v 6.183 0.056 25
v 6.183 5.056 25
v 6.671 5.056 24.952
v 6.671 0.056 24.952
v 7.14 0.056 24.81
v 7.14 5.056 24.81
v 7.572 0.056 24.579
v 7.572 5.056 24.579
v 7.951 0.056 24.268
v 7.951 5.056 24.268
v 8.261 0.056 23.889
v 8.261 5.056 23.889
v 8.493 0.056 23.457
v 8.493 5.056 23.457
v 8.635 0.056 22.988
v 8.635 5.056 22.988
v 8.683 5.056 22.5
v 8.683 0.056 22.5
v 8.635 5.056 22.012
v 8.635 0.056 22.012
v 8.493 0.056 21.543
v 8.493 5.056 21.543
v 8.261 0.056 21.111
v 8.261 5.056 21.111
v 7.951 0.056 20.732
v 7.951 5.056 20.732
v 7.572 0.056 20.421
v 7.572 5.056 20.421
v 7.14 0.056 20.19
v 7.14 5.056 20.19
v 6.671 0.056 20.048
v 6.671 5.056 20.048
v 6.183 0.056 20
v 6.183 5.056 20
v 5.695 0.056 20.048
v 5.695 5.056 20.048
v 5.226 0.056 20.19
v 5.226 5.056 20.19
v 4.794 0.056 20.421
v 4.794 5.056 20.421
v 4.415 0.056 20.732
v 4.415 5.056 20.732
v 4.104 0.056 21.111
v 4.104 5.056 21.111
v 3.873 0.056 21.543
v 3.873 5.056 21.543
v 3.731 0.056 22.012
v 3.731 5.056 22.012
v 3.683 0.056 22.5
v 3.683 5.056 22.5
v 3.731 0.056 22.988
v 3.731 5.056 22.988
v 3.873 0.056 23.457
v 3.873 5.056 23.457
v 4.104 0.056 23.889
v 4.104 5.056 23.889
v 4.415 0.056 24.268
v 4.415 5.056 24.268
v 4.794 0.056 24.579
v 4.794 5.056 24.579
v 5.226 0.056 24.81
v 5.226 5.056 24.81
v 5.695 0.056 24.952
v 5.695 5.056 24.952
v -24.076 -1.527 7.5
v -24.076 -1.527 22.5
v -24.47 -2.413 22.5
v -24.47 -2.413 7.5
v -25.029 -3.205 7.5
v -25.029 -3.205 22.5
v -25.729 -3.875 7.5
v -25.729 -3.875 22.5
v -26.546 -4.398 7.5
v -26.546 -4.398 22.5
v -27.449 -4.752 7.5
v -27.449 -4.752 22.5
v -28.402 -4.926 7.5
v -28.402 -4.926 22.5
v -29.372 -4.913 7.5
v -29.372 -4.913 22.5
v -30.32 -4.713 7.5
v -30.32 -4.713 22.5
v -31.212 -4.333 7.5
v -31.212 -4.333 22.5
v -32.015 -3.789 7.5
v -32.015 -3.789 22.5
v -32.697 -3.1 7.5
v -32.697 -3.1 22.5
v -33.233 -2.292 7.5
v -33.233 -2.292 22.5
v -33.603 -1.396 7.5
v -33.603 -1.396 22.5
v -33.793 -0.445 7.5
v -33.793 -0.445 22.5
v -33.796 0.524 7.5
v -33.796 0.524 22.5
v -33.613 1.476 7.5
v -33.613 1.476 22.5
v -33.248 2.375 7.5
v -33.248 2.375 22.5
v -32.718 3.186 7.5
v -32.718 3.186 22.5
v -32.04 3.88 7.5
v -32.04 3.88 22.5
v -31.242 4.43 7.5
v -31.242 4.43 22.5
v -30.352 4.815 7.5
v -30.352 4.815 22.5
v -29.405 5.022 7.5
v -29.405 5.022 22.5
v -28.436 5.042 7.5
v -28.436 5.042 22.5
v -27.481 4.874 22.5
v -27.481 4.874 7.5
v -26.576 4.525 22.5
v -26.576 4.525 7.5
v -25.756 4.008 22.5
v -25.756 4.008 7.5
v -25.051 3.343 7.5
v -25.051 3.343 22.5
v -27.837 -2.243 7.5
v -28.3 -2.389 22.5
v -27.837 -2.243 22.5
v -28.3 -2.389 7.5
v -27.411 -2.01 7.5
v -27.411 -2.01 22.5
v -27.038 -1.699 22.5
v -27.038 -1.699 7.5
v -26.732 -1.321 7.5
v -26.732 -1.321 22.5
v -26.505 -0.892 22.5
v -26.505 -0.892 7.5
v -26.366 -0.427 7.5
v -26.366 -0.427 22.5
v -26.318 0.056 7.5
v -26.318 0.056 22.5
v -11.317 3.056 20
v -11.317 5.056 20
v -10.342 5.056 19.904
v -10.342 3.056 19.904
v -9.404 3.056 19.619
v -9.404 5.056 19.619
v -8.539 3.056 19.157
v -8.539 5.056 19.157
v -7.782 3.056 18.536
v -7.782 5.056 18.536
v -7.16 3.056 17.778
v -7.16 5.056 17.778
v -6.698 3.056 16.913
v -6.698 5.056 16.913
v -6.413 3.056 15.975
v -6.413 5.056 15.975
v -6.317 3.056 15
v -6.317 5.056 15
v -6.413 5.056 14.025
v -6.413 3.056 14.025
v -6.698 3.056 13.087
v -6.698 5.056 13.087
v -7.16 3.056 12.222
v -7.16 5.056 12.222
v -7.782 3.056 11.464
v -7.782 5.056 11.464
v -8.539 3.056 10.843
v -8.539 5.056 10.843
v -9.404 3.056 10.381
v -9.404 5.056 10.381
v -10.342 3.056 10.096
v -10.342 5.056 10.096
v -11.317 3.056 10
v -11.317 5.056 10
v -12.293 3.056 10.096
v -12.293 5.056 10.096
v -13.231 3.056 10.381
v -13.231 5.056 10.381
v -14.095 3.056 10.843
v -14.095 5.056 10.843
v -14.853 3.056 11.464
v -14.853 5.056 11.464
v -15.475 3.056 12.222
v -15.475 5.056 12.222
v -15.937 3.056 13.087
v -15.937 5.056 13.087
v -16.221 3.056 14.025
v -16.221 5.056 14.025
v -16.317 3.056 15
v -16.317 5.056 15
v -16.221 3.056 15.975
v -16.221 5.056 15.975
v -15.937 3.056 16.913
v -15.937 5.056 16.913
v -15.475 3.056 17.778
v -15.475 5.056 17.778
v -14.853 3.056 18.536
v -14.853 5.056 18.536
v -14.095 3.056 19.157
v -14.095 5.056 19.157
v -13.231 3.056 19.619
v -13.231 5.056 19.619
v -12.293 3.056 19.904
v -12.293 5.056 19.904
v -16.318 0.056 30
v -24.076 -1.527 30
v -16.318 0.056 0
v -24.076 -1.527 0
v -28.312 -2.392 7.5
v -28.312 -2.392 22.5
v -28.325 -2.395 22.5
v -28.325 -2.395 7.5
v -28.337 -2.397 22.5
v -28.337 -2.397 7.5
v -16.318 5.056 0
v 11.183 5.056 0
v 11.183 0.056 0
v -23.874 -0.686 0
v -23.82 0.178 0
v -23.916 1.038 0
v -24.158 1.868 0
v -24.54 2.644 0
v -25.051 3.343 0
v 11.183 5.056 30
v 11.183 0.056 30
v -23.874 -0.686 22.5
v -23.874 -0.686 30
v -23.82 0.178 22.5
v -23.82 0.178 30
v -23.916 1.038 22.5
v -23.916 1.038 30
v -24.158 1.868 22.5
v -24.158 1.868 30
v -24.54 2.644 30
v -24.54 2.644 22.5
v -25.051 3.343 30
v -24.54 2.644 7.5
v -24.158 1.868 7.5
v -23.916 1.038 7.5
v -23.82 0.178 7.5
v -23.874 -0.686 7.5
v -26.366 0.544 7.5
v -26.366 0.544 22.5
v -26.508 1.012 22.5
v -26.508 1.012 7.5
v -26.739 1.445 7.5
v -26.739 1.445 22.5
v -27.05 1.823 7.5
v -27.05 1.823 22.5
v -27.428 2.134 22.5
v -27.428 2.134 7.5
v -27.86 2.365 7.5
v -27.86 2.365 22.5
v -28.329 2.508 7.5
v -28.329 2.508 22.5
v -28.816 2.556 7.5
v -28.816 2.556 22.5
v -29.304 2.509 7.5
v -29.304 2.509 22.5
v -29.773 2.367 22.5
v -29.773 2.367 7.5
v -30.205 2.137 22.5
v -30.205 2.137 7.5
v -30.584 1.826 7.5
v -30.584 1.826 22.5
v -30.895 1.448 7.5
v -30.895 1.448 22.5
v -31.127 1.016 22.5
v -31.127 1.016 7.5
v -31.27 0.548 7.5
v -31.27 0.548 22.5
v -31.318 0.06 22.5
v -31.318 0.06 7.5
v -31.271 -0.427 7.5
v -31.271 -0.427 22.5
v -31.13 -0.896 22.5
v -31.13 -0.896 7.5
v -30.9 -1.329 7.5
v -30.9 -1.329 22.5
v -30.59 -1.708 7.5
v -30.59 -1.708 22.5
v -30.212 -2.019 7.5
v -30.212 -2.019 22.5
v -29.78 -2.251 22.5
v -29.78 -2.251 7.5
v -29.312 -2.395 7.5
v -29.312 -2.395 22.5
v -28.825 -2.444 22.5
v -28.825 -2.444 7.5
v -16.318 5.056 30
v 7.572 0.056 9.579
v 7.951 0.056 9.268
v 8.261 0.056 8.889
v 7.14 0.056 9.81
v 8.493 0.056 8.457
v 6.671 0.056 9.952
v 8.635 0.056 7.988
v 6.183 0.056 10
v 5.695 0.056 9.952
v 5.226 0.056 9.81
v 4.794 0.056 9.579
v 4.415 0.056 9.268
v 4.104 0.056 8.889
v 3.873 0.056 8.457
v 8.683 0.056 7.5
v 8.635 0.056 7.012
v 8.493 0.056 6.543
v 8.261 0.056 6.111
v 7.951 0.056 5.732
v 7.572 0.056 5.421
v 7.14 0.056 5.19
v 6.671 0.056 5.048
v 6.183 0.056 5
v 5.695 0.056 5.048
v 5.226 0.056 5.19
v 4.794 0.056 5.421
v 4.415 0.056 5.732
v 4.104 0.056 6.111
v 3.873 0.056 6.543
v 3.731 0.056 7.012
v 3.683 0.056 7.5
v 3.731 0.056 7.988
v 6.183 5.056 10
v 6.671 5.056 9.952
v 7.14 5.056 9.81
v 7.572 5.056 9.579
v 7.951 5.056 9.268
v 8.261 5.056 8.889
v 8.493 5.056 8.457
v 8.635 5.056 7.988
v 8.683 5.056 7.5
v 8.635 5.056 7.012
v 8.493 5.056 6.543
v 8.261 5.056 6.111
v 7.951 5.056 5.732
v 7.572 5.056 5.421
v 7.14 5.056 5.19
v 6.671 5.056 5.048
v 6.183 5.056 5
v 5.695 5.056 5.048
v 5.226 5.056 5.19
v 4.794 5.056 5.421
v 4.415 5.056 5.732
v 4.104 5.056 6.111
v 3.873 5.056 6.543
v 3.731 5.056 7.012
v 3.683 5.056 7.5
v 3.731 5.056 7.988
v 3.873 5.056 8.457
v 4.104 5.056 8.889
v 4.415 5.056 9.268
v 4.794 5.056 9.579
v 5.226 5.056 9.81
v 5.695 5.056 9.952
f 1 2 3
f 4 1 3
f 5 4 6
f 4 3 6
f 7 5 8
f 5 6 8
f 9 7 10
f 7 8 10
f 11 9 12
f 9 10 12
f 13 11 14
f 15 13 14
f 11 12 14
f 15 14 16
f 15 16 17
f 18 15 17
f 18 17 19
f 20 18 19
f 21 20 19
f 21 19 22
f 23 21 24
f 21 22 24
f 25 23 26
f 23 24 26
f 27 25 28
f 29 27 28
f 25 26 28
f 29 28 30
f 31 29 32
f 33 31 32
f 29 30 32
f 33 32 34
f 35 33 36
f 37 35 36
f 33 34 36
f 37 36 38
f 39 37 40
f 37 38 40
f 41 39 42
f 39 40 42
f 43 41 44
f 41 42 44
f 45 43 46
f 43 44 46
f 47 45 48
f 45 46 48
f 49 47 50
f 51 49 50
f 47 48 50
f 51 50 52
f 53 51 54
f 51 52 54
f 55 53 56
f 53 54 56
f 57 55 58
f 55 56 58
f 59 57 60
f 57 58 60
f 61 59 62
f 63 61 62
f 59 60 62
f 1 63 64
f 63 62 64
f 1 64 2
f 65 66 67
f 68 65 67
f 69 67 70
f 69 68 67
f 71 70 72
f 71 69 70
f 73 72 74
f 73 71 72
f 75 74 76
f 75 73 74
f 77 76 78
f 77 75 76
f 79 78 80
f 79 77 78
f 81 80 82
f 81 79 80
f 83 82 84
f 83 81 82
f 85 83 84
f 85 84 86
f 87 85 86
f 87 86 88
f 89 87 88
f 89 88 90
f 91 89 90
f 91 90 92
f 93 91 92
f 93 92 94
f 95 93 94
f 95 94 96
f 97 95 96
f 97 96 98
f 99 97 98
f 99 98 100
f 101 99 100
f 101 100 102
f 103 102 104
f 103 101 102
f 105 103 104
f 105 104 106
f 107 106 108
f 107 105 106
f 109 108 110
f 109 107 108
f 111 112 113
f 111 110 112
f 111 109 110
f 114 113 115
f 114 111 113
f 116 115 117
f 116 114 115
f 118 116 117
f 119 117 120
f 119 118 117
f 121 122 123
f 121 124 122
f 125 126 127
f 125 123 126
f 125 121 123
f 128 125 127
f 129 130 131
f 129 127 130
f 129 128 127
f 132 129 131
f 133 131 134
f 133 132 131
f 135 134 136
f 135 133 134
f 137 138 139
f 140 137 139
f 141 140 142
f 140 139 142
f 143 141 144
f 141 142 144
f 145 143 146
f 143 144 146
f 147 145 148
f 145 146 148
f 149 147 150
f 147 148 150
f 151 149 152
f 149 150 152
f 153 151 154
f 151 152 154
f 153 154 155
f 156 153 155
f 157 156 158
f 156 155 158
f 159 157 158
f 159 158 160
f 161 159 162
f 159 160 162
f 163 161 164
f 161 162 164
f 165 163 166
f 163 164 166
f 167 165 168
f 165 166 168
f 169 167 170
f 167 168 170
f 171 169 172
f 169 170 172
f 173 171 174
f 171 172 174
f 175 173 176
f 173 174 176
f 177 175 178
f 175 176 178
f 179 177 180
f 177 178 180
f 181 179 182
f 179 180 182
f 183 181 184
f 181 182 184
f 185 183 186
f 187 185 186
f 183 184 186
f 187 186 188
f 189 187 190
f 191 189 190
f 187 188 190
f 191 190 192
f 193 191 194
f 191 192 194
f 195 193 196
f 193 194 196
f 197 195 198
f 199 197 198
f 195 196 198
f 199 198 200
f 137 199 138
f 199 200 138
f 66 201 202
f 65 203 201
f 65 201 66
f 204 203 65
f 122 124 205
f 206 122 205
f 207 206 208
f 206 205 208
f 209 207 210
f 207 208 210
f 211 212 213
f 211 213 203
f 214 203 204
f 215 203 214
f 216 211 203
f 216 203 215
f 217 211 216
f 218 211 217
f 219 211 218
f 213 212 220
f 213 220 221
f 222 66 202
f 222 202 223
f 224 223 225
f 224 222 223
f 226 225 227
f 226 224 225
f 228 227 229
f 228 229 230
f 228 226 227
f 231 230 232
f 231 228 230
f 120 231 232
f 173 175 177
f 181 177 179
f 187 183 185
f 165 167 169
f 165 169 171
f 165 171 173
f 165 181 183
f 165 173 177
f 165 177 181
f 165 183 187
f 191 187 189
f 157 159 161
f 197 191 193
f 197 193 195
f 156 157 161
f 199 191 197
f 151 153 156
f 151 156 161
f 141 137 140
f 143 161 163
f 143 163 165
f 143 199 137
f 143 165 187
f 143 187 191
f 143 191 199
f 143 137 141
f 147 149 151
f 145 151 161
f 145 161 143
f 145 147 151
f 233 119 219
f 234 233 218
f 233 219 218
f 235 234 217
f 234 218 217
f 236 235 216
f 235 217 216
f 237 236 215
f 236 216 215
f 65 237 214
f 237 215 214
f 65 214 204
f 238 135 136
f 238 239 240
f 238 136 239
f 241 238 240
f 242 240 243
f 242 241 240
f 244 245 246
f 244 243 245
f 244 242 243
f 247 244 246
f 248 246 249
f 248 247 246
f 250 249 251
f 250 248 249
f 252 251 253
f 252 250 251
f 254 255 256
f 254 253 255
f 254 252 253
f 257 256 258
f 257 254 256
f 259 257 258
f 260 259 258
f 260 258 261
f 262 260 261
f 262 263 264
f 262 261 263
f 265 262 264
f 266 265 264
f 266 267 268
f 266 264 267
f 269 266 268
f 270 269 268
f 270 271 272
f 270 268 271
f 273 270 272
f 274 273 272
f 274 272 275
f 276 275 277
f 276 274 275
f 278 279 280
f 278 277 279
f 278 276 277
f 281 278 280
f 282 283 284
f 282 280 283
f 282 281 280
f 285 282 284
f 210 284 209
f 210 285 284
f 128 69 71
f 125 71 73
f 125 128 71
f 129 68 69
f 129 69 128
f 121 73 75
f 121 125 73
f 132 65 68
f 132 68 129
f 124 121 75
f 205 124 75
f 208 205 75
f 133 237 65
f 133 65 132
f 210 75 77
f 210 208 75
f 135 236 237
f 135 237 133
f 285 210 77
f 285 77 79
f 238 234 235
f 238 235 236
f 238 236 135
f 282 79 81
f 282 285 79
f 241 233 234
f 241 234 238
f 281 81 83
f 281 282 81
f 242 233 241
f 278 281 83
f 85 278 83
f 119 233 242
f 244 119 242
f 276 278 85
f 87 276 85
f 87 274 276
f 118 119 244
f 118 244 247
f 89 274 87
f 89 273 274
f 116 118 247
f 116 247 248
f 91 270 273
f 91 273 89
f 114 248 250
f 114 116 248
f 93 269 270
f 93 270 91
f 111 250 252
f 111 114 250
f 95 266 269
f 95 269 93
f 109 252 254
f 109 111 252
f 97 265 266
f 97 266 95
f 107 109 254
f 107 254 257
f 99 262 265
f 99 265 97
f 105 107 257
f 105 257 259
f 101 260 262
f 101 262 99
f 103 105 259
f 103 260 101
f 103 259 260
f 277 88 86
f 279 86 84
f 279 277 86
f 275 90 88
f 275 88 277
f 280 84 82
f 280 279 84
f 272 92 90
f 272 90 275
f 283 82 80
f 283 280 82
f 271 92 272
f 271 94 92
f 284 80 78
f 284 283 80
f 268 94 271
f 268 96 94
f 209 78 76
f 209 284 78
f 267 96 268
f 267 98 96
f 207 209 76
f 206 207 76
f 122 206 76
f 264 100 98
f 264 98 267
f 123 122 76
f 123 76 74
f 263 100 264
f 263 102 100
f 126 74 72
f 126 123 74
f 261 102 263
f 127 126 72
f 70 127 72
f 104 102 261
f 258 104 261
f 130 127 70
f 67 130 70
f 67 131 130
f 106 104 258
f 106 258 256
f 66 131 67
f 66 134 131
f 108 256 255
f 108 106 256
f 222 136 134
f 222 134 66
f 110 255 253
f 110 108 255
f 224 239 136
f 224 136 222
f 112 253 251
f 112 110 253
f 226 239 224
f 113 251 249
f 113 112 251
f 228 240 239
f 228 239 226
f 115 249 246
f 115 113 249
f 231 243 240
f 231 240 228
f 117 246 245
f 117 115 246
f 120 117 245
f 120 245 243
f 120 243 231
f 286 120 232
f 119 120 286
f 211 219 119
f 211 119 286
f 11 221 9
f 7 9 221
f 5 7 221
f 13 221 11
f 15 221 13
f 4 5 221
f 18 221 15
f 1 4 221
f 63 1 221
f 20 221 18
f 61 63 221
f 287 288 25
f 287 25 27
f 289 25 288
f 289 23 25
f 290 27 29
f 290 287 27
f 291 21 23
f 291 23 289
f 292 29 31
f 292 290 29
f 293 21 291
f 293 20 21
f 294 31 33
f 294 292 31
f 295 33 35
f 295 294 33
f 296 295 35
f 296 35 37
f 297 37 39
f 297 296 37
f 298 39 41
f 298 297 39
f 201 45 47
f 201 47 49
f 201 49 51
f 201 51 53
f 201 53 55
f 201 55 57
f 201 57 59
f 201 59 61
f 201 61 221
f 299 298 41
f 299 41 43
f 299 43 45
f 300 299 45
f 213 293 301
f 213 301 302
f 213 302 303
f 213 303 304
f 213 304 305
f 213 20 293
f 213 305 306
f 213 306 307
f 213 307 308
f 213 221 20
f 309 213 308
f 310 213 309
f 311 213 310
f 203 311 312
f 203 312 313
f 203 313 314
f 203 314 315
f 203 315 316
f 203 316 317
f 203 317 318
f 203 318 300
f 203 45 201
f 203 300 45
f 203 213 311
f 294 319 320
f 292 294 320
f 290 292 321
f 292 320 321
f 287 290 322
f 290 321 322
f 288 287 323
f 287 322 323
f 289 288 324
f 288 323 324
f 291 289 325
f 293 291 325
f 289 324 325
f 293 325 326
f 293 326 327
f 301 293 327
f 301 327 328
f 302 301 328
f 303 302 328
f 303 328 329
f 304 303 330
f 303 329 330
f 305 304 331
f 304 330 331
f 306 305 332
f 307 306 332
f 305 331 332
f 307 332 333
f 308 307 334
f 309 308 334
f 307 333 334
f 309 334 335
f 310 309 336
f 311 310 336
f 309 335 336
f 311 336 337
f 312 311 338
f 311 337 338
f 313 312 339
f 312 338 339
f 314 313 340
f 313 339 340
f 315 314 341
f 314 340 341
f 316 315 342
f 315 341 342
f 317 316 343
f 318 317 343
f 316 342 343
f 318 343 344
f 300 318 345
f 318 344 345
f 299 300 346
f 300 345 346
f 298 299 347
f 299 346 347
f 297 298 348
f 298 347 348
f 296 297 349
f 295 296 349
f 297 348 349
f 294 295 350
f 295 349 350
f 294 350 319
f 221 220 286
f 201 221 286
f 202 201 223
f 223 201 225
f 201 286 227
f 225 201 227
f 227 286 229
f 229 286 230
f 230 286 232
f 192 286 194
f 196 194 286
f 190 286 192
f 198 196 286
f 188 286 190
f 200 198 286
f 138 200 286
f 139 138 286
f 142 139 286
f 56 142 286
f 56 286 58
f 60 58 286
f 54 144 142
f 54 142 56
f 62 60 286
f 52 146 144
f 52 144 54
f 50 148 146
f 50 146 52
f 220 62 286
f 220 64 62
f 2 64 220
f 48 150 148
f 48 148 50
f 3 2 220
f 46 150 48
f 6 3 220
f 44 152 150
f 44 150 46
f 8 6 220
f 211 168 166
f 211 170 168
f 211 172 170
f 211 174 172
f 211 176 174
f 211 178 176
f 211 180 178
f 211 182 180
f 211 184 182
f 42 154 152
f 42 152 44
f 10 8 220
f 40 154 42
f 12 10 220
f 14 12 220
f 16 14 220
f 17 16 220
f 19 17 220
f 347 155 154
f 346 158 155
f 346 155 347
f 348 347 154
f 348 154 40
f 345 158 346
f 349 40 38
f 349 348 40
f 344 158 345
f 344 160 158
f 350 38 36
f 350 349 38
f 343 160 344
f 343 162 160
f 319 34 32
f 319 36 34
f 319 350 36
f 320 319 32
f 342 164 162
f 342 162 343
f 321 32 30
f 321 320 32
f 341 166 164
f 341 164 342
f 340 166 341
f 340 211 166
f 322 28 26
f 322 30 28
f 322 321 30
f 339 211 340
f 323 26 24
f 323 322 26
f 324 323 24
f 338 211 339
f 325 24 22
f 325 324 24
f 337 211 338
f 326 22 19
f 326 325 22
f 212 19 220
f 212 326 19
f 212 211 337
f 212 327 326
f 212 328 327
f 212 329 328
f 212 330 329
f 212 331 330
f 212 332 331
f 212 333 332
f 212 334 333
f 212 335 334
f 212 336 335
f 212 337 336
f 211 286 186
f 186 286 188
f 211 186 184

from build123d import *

# Parameters (mm, degrees)
Y_KSEKLIK_EKSTR_ZYON1_DEPTH = 30
KES_EKSTR_ZYON1_START       = -30
IZIM2_R                     = 2.5
KES_EKSTR_ZYON1_DEPTH       = 30
KES_EKSTR_ZYON3_START       = -7.5
IZIM6_R                     = 5
KES_EKSTR_ZYON3_DEPTH       = 7.5
IZIM7_R                     = 5
KES_EKSTR_ZYON4_DEPTH       = 7.5
IZIM9_R                     = 5
KES_EKSTR_ZYON6_DEPTH       = 2
IZIM10_R                    = 2.5
KES_EKSTR_ZYON7_DEPTH       = 5


with BuildPart() as part:
    # Çizim1 → Yükseklik-Ekstrüzyon1 (new body)
    with BuildSketch(Plane.XY):
        with BuildLine():
            Line((-25.050567114, 3.343092307), (-16.318399297, 5.056233526))
            Line((-16.318399297, 5.056233526), (3.922819568, 5.056233526))
            Line((3.922819568, 5.056233526), (6.182819568, 5.056233526))
            Line((6.182819568, 5.056233526), (11.182819568, 5.056233526))
            Line((11.182819568, 5.056233526), (11.182819568, 0.056233526))
            Line((11.182819568, 0.056233526), (6.182819568, 0.056233526))
            Line((6.182819568, 0.056233526), (3.922819568, 0.056233526))
            Line((3.922819568, 0.056233526), (-16.318399297, 0.056233526))
            Line((-16.318399297, 0.056233526), (-24.07574143, -1.527179355))
            ThreePointArc((-24.07574143, -1.527179355), (-33.721153292, -0.925093769), (-25.050567114, 3.343092307))
        make_face()
        with BuildLine():
            Line((-28.337105741, -2.397000362), (-28.299750993, -2.389375587))
            ThreePointArc((-28.299750993, -2.389375587), (-28.318413832, -2.393259183), (-28.337105741, -2.397000362))
        make_face(mode=Mode.SUBTRACT)
    extrude(amount=Y_KSEKLIK_EKSTR_ZYON1_DEPTH)

    # Çizim2 → Kes-Ekstrüzyon1 (cut)
    with BuildSketch(Plane.XY.offset(30).offset(KES_EKSTR_ZYON1_START)):
        with Locations((-28.818399297, 0.056233526)):
            Circle(IZIM2_R)
    extrude(amount=KES_EKSTR_ZYON1_DEPTH, mode=Mode.SUBTRACT)

    # Çizim6 → Kes-Ekstrüzyon3 (cut)
    with BuildSketch(Plane.XY.offset(30).offset(KES_EKSTR_ZYON3_START)):
        with Locations((-28.818399297, 0.056233526)):
            Circle(IZIM6_R)
    extrude(amount=KES_EKSTR_ZYON3_DEPTH, mode=Mode.SUBTRACT)

    # Çizim7 → Kes-Ekstrüzyon4 (cut)
    with BuildSketch(Plane(origin=(0, 0, 0), x_dir=(-1, 0, 0), z_dir=(0, 0, -1))):
        with Locations((28.818399297, 0.056233526)):
            Circle(IZIM7_R)
    extrude(amount=-KES_EKSTR_ZYON4_DEPTH, mode=Mode.SUBTRACT)

    # Çizim9 → Kes-Ekstrüzyon6 (cut)
    with BuildSketch(Plane(origin=(0, 5.056233526, 0), x_dir=(1, 0, 0), z_dir=(0, 1, 0))):
        with Locations(Location((-11.317180432, -15, 0), (0, 0, 270))):
            Circle(IZIM9_R)
    extrude(amount=-KES_EKSTR_ZYON6_DEPTH, mode=Mode.SUBTRACT)

    # Çizim10 → Kes-Ekstrüzyon7 (cut)
    with BuildSketch(Plane(origin=(0, 5.056233526, 0), x_dir=(1, 0, 0), z_dir=(0, 1, 0))):
        with Locations(Location((6.182819568, -22.5, 0), (0, 0, 270))):
            Circle(IZIM10_R)
        with Locations(Location((6.182819568, -7.5, 0), (0, 0, 270))):
            Circle(IZIM10_R)
    extrude(amount=-KES_EKSTR_ZYON7_DEPTH, mode=Mode.SUBTRACT)


solid = part.part
